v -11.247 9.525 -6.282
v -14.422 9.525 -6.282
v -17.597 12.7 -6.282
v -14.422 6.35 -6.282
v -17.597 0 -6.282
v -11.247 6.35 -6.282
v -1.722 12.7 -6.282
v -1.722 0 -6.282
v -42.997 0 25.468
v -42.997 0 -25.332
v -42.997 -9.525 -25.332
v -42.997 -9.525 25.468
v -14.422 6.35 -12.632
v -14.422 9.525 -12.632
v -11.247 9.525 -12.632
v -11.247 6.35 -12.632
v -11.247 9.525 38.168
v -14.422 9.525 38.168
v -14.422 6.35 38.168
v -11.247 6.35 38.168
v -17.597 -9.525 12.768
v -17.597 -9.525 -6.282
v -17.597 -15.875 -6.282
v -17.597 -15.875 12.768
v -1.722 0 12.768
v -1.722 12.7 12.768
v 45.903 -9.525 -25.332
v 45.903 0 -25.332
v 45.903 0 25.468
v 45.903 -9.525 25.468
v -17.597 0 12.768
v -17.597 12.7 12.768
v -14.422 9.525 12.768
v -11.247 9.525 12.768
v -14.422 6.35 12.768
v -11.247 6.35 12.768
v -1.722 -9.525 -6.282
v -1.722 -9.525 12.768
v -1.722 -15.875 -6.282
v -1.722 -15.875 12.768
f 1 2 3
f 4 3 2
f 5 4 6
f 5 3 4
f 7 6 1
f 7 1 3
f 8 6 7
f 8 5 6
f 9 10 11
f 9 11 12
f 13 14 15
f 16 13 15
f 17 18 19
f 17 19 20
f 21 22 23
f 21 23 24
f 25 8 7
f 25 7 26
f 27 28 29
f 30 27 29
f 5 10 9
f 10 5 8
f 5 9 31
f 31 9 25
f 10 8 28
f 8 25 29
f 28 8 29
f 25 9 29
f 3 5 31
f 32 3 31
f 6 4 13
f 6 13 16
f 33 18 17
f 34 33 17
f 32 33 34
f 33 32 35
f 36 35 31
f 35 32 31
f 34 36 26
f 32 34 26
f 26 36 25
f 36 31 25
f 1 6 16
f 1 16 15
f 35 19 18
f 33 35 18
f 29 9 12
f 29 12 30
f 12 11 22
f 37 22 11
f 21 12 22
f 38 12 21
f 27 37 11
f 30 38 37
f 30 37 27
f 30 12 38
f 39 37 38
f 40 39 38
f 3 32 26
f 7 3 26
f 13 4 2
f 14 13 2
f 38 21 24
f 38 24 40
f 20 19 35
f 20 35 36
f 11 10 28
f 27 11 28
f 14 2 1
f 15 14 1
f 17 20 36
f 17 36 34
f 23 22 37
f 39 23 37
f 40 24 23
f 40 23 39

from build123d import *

# Parameters (mm, degrees)
F0_W          = 88.9
F0_H          = 50.8
F1_DEPTH      = 9.525
F2_W          = 15.875
F2_H          = 19.05
F3_DEPTH      = 6.35
F3_DEPTH_BACK = 22.225
F4_W          = 3.175
F4_H          = 3.175
F5_DEPTH      = 25.4
F5_DEPTH_BACK = 25.4


with BuildPart() as f1:
    # F0 (on Front) → F1 (new body)
    with BuildSketch(Plane.XZ):
        with Locations((1.452832, 0.068092)):
            Rectangle(F0_W, F0_H)
    extrude(amount=F1_DEPTH)

    # F2 (on face) → F3 (join, two sides)
    with BuildSketch(Plane.XZ.offset(9.525)) as f3_sk:
        with Locations((-9.659668, 3.243092)):
            Rectangle(F2_W, F2_H)
    extrude(amount=F3_DEPTH)
    extrude(f3_sk.sketch, amount=-F3_DEPTH_BACK)

    # F4 (on face) → F5 (join, two sides)
    with BuildSketch(Plane.XY.offset(12.768092)) as f5_sk:
        with Locations((-12.834668, 7.9375)):
            Rectangle(F4_W, F4_H)
    extrude(amount=F5_DEPTH)
    extrude(f5_sk.sketch, amount=-F5_DEPTH_BACK)


solid = f1.part
